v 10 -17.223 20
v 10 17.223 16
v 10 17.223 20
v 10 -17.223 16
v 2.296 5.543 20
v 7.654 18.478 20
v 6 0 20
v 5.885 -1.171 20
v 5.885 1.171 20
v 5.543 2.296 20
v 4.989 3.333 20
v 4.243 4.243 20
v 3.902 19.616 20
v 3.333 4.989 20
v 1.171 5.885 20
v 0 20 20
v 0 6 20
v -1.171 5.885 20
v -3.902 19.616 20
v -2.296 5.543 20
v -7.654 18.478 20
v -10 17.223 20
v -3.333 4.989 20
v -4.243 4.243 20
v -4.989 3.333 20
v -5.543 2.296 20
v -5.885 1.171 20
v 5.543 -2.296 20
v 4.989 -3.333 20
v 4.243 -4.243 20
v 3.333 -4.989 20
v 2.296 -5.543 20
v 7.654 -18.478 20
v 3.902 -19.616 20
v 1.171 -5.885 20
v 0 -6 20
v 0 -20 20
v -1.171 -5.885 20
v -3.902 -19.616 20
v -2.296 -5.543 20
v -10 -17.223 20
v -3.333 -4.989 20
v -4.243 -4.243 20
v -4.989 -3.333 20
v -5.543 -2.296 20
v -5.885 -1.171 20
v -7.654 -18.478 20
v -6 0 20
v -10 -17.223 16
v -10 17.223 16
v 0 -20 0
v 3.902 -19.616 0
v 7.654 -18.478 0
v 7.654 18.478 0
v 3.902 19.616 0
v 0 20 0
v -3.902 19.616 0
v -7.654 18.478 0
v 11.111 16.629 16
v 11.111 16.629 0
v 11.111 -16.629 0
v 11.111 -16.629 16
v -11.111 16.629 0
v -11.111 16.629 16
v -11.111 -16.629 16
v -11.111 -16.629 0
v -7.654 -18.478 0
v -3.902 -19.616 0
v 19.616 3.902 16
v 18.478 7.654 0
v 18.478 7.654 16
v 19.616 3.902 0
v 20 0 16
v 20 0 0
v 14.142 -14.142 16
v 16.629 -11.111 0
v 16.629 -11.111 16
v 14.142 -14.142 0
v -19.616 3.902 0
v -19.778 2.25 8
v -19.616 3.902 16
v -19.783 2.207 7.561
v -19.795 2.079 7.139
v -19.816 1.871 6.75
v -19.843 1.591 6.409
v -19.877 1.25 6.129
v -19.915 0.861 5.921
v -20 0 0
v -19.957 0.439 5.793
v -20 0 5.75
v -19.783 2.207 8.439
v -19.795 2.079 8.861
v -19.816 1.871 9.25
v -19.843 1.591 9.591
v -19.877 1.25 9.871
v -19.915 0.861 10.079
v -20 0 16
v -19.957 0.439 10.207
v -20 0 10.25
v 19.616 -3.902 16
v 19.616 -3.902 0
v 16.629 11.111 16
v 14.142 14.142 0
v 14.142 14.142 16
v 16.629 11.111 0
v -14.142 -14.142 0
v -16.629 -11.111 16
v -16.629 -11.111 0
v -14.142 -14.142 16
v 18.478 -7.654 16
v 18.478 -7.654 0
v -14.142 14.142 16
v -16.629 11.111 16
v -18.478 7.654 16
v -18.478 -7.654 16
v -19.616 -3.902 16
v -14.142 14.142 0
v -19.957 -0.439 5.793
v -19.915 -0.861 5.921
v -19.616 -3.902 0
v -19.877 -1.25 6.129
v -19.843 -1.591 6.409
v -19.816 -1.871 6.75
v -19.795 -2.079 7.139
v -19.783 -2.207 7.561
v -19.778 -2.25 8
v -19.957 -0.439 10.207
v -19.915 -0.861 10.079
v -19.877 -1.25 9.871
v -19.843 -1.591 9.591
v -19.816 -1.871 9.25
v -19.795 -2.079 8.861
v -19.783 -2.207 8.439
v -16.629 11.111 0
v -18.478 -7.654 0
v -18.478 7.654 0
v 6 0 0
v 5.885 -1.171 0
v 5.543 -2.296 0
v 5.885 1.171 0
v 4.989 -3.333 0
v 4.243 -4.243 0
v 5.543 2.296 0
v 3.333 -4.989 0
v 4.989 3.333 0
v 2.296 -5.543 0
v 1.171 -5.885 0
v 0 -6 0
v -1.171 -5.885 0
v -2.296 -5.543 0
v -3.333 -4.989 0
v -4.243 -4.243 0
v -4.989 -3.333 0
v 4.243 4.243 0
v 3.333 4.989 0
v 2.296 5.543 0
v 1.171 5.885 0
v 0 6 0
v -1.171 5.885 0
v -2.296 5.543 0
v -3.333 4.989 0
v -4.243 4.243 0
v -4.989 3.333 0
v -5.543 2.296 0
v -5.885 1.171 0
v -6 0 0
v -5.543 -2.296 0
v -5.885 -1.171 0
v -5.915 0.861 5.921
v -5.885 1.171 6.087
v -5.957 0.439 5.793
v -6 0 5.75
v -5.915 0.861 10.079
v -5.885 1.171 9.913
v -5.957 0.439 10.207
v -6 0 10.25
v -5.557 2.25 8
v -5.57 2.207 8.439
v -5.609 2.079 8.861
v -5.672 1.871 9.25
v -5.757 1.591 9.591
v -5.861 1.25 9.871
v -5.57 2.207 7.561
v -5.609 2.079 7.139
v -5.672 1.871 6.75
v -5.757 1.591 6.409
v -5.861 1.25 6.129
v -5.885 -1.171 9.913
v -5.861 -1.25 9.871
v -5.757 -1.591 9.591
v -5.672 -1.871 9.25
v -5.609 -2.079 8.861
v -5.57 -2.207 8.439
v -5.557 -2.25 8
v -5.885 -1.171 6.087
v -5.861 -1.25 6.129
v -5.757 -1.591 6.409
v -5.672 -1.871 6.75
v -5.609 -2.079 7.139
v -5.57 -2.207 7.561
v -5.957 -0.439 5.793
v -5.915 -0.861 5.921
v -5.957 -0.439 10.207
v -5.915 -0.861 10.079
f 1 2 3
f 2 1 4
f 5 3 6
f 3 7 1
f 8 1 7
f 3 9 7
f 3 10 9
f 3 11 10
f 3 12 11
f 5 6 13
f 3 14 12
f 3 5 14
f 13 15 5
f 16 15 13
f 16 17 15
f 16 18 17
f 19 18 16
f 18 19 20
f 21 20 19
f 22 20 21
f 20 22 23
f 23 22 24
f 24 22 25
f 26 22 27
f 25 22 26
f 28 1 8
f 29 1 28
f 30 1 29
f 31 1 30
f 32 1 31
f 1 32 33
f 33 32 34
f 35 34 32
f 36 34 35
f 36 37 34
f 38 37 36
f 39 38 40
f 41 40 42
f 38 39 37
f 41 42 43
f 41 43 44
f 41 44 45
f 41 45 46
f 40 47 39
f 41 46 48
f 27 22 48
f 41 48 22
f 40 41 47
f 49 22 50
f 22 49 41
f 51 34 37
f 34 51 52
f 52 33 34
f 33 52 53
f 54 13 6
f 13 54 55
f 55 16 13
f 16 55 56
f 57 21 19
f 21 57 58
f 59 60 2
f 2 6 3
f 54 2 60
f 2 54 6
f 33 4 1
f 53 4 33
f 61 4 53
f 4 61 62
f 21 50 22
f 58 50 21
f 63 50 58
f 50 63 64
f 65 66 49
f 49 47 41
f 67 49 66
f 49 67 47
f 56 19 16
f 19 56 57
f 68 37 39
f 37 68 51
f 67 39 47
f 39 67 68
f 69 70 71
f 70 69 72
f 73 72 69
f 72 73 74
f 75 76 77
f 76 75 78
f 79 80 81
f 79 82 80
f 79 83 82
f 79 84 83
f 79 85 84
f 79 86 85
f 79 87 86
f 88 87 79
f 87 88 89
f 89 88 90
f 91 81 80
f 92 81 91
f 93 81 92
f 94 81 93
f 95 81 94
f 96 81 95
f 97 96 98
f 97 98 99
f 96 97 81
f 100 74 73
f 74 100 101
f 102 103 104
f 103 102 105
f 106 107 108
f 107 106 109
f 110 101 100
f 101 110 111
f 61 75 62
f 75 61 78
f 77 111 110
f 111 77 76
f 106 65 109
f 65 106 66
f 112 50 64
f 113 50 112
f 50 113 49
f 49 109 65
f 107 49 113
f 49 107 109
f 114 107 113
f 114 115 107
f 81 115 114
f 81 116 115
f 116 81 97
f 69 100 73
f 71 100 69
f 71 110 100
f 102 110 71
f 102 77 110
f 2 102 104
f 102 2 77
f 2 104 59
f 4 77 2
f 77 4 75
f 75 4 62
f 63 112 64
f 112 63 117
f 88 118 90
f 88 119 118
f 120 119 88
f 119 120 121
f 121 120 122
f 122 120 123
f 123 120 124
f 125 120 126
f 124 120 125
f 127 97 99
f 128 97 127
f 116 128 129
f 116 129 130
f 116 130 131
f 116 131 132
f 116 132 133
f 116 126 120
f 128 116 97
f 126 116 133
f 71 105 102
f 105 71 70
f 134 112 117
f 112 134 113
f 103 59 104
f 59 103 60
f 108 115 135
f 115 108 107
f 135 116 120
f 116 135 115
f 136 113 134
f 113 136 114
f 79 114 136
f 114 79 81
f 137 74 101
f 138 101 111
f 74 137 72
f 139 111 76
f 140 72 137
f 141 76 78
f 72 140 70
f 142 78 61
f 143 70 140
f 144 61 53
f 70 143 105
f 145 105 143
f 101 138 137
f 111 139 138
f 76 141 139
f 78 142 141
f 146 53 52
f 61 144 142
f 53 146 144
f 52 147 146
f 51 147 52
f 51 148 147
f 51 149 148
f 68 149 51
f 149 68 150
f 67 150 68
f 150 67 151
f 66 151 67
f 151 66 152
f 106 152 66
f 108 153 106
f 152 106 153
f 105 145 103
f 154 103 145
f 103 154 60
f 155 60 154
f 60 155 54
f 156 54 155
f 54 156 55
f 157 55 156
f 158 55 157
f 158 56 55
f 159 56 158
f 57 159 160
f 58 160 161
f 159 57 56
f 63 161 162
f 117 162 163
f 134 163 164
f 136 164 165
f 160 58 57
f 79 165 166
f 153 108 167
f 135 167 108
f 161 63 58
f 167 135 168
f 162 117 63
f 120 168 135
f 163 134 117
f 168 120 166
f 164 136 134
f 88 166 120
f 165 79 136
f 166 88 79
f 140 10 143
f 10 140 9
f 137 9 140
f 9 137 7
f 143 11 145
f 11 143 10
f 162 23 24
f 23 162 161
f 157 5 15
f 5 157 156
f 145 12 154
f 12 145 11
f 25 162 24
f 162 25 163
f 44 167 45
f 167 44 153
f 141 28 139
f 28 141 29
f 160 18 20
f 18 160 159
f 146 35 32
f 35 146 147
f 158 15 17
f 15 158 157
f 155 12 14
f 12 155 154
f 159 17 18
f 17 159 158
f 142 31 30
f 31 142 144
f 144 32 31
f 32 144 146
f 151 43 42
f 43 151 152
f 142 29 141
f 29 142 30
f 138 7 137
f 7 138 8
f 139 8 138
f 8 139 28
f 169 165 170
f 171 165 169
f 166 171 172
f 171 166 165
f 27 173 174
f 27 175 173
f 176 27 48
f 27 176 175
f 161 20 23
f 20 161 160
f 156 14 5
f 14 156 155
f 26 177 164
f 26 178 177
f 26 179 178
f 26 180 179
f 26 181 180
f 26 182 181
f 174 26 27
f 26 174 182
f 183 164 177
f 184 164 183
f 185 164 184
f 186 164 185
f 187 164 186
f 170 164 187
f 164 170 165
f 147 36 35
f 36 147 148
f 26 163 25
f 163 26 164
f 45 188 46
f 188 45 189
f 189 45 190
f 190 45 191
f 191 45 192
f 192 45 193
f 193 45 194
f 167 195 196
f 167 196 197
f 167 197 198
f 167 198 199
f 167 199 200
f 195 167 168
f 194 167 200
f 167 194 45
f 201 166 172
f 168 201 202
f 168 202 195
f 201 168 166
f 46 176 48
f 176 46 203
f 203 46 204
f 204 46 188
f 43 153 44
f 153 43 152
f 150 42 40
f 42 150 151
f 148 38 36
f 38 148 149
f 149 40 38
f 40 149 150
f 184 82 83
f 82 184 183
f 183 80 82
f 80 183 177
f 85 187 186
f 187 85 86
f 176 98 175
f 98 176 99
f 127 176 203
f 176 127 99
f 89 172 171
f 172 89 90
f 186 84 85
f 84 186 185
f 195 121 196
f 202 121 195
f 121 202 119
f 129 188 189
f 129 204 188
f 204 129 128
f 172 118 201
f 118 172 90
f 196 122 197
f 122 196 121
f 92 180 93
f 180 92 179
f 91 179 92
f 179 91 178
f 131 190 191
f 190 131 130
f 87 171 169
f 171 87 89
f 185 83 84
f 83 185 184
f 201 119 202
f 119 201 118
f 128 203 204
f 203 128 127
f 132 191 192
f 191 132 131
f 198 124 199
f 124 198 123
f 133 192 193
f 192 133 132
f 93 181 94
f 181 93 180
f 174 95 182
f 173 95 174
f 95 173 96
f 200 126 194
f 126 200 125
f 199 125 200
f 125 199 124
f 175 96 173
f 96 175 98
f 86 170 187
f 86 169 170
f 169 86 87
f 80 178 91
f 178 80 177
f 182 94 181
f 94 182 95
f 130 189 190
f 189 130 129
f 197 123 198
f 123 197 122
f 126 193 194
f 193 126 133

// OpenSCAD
$fn = 32;

// ----------------------------------------------------------------------
// Oldham coupling hub: 40 x 20 mm
// ----------------------------------------------------------------------

// --- parameters (mm) ---
body_d = 40;              // hub diameter
body_l = 16;              // hub length
shaft_d = 12;             // shaft bore
cam_w = 20;               // drive tongue width
tongue_h = 4;             // drive tongue height
set_d = 4.5;              // set screw tap hole

module hub() {
  cylinder(h = body_l, d = body_d);
  /* tongue, clipped to the hub disc and sunk 1 mm into the face */
  intersection() {
    translate([-cam_w / 2, -body_d / 2, body_l - 1])
      cube([cam_w, body_d, tongue_h + 1]);
    translate([0, 0, body_l - 1]) cylinder(h = tongue_h + 1, d = body_d);
  }
}

difference() {
  hub();
  translate([0, 0, -1]) cylinder(h = body_l + tongue_h + 2, d = shaft_d);
  translate([-body_d / 2 - 1, 0, body_l * 0.5])
    rotate([0, 90, 0]) cylinder(h = body_d / 2 + 2, d = set_d);
}
